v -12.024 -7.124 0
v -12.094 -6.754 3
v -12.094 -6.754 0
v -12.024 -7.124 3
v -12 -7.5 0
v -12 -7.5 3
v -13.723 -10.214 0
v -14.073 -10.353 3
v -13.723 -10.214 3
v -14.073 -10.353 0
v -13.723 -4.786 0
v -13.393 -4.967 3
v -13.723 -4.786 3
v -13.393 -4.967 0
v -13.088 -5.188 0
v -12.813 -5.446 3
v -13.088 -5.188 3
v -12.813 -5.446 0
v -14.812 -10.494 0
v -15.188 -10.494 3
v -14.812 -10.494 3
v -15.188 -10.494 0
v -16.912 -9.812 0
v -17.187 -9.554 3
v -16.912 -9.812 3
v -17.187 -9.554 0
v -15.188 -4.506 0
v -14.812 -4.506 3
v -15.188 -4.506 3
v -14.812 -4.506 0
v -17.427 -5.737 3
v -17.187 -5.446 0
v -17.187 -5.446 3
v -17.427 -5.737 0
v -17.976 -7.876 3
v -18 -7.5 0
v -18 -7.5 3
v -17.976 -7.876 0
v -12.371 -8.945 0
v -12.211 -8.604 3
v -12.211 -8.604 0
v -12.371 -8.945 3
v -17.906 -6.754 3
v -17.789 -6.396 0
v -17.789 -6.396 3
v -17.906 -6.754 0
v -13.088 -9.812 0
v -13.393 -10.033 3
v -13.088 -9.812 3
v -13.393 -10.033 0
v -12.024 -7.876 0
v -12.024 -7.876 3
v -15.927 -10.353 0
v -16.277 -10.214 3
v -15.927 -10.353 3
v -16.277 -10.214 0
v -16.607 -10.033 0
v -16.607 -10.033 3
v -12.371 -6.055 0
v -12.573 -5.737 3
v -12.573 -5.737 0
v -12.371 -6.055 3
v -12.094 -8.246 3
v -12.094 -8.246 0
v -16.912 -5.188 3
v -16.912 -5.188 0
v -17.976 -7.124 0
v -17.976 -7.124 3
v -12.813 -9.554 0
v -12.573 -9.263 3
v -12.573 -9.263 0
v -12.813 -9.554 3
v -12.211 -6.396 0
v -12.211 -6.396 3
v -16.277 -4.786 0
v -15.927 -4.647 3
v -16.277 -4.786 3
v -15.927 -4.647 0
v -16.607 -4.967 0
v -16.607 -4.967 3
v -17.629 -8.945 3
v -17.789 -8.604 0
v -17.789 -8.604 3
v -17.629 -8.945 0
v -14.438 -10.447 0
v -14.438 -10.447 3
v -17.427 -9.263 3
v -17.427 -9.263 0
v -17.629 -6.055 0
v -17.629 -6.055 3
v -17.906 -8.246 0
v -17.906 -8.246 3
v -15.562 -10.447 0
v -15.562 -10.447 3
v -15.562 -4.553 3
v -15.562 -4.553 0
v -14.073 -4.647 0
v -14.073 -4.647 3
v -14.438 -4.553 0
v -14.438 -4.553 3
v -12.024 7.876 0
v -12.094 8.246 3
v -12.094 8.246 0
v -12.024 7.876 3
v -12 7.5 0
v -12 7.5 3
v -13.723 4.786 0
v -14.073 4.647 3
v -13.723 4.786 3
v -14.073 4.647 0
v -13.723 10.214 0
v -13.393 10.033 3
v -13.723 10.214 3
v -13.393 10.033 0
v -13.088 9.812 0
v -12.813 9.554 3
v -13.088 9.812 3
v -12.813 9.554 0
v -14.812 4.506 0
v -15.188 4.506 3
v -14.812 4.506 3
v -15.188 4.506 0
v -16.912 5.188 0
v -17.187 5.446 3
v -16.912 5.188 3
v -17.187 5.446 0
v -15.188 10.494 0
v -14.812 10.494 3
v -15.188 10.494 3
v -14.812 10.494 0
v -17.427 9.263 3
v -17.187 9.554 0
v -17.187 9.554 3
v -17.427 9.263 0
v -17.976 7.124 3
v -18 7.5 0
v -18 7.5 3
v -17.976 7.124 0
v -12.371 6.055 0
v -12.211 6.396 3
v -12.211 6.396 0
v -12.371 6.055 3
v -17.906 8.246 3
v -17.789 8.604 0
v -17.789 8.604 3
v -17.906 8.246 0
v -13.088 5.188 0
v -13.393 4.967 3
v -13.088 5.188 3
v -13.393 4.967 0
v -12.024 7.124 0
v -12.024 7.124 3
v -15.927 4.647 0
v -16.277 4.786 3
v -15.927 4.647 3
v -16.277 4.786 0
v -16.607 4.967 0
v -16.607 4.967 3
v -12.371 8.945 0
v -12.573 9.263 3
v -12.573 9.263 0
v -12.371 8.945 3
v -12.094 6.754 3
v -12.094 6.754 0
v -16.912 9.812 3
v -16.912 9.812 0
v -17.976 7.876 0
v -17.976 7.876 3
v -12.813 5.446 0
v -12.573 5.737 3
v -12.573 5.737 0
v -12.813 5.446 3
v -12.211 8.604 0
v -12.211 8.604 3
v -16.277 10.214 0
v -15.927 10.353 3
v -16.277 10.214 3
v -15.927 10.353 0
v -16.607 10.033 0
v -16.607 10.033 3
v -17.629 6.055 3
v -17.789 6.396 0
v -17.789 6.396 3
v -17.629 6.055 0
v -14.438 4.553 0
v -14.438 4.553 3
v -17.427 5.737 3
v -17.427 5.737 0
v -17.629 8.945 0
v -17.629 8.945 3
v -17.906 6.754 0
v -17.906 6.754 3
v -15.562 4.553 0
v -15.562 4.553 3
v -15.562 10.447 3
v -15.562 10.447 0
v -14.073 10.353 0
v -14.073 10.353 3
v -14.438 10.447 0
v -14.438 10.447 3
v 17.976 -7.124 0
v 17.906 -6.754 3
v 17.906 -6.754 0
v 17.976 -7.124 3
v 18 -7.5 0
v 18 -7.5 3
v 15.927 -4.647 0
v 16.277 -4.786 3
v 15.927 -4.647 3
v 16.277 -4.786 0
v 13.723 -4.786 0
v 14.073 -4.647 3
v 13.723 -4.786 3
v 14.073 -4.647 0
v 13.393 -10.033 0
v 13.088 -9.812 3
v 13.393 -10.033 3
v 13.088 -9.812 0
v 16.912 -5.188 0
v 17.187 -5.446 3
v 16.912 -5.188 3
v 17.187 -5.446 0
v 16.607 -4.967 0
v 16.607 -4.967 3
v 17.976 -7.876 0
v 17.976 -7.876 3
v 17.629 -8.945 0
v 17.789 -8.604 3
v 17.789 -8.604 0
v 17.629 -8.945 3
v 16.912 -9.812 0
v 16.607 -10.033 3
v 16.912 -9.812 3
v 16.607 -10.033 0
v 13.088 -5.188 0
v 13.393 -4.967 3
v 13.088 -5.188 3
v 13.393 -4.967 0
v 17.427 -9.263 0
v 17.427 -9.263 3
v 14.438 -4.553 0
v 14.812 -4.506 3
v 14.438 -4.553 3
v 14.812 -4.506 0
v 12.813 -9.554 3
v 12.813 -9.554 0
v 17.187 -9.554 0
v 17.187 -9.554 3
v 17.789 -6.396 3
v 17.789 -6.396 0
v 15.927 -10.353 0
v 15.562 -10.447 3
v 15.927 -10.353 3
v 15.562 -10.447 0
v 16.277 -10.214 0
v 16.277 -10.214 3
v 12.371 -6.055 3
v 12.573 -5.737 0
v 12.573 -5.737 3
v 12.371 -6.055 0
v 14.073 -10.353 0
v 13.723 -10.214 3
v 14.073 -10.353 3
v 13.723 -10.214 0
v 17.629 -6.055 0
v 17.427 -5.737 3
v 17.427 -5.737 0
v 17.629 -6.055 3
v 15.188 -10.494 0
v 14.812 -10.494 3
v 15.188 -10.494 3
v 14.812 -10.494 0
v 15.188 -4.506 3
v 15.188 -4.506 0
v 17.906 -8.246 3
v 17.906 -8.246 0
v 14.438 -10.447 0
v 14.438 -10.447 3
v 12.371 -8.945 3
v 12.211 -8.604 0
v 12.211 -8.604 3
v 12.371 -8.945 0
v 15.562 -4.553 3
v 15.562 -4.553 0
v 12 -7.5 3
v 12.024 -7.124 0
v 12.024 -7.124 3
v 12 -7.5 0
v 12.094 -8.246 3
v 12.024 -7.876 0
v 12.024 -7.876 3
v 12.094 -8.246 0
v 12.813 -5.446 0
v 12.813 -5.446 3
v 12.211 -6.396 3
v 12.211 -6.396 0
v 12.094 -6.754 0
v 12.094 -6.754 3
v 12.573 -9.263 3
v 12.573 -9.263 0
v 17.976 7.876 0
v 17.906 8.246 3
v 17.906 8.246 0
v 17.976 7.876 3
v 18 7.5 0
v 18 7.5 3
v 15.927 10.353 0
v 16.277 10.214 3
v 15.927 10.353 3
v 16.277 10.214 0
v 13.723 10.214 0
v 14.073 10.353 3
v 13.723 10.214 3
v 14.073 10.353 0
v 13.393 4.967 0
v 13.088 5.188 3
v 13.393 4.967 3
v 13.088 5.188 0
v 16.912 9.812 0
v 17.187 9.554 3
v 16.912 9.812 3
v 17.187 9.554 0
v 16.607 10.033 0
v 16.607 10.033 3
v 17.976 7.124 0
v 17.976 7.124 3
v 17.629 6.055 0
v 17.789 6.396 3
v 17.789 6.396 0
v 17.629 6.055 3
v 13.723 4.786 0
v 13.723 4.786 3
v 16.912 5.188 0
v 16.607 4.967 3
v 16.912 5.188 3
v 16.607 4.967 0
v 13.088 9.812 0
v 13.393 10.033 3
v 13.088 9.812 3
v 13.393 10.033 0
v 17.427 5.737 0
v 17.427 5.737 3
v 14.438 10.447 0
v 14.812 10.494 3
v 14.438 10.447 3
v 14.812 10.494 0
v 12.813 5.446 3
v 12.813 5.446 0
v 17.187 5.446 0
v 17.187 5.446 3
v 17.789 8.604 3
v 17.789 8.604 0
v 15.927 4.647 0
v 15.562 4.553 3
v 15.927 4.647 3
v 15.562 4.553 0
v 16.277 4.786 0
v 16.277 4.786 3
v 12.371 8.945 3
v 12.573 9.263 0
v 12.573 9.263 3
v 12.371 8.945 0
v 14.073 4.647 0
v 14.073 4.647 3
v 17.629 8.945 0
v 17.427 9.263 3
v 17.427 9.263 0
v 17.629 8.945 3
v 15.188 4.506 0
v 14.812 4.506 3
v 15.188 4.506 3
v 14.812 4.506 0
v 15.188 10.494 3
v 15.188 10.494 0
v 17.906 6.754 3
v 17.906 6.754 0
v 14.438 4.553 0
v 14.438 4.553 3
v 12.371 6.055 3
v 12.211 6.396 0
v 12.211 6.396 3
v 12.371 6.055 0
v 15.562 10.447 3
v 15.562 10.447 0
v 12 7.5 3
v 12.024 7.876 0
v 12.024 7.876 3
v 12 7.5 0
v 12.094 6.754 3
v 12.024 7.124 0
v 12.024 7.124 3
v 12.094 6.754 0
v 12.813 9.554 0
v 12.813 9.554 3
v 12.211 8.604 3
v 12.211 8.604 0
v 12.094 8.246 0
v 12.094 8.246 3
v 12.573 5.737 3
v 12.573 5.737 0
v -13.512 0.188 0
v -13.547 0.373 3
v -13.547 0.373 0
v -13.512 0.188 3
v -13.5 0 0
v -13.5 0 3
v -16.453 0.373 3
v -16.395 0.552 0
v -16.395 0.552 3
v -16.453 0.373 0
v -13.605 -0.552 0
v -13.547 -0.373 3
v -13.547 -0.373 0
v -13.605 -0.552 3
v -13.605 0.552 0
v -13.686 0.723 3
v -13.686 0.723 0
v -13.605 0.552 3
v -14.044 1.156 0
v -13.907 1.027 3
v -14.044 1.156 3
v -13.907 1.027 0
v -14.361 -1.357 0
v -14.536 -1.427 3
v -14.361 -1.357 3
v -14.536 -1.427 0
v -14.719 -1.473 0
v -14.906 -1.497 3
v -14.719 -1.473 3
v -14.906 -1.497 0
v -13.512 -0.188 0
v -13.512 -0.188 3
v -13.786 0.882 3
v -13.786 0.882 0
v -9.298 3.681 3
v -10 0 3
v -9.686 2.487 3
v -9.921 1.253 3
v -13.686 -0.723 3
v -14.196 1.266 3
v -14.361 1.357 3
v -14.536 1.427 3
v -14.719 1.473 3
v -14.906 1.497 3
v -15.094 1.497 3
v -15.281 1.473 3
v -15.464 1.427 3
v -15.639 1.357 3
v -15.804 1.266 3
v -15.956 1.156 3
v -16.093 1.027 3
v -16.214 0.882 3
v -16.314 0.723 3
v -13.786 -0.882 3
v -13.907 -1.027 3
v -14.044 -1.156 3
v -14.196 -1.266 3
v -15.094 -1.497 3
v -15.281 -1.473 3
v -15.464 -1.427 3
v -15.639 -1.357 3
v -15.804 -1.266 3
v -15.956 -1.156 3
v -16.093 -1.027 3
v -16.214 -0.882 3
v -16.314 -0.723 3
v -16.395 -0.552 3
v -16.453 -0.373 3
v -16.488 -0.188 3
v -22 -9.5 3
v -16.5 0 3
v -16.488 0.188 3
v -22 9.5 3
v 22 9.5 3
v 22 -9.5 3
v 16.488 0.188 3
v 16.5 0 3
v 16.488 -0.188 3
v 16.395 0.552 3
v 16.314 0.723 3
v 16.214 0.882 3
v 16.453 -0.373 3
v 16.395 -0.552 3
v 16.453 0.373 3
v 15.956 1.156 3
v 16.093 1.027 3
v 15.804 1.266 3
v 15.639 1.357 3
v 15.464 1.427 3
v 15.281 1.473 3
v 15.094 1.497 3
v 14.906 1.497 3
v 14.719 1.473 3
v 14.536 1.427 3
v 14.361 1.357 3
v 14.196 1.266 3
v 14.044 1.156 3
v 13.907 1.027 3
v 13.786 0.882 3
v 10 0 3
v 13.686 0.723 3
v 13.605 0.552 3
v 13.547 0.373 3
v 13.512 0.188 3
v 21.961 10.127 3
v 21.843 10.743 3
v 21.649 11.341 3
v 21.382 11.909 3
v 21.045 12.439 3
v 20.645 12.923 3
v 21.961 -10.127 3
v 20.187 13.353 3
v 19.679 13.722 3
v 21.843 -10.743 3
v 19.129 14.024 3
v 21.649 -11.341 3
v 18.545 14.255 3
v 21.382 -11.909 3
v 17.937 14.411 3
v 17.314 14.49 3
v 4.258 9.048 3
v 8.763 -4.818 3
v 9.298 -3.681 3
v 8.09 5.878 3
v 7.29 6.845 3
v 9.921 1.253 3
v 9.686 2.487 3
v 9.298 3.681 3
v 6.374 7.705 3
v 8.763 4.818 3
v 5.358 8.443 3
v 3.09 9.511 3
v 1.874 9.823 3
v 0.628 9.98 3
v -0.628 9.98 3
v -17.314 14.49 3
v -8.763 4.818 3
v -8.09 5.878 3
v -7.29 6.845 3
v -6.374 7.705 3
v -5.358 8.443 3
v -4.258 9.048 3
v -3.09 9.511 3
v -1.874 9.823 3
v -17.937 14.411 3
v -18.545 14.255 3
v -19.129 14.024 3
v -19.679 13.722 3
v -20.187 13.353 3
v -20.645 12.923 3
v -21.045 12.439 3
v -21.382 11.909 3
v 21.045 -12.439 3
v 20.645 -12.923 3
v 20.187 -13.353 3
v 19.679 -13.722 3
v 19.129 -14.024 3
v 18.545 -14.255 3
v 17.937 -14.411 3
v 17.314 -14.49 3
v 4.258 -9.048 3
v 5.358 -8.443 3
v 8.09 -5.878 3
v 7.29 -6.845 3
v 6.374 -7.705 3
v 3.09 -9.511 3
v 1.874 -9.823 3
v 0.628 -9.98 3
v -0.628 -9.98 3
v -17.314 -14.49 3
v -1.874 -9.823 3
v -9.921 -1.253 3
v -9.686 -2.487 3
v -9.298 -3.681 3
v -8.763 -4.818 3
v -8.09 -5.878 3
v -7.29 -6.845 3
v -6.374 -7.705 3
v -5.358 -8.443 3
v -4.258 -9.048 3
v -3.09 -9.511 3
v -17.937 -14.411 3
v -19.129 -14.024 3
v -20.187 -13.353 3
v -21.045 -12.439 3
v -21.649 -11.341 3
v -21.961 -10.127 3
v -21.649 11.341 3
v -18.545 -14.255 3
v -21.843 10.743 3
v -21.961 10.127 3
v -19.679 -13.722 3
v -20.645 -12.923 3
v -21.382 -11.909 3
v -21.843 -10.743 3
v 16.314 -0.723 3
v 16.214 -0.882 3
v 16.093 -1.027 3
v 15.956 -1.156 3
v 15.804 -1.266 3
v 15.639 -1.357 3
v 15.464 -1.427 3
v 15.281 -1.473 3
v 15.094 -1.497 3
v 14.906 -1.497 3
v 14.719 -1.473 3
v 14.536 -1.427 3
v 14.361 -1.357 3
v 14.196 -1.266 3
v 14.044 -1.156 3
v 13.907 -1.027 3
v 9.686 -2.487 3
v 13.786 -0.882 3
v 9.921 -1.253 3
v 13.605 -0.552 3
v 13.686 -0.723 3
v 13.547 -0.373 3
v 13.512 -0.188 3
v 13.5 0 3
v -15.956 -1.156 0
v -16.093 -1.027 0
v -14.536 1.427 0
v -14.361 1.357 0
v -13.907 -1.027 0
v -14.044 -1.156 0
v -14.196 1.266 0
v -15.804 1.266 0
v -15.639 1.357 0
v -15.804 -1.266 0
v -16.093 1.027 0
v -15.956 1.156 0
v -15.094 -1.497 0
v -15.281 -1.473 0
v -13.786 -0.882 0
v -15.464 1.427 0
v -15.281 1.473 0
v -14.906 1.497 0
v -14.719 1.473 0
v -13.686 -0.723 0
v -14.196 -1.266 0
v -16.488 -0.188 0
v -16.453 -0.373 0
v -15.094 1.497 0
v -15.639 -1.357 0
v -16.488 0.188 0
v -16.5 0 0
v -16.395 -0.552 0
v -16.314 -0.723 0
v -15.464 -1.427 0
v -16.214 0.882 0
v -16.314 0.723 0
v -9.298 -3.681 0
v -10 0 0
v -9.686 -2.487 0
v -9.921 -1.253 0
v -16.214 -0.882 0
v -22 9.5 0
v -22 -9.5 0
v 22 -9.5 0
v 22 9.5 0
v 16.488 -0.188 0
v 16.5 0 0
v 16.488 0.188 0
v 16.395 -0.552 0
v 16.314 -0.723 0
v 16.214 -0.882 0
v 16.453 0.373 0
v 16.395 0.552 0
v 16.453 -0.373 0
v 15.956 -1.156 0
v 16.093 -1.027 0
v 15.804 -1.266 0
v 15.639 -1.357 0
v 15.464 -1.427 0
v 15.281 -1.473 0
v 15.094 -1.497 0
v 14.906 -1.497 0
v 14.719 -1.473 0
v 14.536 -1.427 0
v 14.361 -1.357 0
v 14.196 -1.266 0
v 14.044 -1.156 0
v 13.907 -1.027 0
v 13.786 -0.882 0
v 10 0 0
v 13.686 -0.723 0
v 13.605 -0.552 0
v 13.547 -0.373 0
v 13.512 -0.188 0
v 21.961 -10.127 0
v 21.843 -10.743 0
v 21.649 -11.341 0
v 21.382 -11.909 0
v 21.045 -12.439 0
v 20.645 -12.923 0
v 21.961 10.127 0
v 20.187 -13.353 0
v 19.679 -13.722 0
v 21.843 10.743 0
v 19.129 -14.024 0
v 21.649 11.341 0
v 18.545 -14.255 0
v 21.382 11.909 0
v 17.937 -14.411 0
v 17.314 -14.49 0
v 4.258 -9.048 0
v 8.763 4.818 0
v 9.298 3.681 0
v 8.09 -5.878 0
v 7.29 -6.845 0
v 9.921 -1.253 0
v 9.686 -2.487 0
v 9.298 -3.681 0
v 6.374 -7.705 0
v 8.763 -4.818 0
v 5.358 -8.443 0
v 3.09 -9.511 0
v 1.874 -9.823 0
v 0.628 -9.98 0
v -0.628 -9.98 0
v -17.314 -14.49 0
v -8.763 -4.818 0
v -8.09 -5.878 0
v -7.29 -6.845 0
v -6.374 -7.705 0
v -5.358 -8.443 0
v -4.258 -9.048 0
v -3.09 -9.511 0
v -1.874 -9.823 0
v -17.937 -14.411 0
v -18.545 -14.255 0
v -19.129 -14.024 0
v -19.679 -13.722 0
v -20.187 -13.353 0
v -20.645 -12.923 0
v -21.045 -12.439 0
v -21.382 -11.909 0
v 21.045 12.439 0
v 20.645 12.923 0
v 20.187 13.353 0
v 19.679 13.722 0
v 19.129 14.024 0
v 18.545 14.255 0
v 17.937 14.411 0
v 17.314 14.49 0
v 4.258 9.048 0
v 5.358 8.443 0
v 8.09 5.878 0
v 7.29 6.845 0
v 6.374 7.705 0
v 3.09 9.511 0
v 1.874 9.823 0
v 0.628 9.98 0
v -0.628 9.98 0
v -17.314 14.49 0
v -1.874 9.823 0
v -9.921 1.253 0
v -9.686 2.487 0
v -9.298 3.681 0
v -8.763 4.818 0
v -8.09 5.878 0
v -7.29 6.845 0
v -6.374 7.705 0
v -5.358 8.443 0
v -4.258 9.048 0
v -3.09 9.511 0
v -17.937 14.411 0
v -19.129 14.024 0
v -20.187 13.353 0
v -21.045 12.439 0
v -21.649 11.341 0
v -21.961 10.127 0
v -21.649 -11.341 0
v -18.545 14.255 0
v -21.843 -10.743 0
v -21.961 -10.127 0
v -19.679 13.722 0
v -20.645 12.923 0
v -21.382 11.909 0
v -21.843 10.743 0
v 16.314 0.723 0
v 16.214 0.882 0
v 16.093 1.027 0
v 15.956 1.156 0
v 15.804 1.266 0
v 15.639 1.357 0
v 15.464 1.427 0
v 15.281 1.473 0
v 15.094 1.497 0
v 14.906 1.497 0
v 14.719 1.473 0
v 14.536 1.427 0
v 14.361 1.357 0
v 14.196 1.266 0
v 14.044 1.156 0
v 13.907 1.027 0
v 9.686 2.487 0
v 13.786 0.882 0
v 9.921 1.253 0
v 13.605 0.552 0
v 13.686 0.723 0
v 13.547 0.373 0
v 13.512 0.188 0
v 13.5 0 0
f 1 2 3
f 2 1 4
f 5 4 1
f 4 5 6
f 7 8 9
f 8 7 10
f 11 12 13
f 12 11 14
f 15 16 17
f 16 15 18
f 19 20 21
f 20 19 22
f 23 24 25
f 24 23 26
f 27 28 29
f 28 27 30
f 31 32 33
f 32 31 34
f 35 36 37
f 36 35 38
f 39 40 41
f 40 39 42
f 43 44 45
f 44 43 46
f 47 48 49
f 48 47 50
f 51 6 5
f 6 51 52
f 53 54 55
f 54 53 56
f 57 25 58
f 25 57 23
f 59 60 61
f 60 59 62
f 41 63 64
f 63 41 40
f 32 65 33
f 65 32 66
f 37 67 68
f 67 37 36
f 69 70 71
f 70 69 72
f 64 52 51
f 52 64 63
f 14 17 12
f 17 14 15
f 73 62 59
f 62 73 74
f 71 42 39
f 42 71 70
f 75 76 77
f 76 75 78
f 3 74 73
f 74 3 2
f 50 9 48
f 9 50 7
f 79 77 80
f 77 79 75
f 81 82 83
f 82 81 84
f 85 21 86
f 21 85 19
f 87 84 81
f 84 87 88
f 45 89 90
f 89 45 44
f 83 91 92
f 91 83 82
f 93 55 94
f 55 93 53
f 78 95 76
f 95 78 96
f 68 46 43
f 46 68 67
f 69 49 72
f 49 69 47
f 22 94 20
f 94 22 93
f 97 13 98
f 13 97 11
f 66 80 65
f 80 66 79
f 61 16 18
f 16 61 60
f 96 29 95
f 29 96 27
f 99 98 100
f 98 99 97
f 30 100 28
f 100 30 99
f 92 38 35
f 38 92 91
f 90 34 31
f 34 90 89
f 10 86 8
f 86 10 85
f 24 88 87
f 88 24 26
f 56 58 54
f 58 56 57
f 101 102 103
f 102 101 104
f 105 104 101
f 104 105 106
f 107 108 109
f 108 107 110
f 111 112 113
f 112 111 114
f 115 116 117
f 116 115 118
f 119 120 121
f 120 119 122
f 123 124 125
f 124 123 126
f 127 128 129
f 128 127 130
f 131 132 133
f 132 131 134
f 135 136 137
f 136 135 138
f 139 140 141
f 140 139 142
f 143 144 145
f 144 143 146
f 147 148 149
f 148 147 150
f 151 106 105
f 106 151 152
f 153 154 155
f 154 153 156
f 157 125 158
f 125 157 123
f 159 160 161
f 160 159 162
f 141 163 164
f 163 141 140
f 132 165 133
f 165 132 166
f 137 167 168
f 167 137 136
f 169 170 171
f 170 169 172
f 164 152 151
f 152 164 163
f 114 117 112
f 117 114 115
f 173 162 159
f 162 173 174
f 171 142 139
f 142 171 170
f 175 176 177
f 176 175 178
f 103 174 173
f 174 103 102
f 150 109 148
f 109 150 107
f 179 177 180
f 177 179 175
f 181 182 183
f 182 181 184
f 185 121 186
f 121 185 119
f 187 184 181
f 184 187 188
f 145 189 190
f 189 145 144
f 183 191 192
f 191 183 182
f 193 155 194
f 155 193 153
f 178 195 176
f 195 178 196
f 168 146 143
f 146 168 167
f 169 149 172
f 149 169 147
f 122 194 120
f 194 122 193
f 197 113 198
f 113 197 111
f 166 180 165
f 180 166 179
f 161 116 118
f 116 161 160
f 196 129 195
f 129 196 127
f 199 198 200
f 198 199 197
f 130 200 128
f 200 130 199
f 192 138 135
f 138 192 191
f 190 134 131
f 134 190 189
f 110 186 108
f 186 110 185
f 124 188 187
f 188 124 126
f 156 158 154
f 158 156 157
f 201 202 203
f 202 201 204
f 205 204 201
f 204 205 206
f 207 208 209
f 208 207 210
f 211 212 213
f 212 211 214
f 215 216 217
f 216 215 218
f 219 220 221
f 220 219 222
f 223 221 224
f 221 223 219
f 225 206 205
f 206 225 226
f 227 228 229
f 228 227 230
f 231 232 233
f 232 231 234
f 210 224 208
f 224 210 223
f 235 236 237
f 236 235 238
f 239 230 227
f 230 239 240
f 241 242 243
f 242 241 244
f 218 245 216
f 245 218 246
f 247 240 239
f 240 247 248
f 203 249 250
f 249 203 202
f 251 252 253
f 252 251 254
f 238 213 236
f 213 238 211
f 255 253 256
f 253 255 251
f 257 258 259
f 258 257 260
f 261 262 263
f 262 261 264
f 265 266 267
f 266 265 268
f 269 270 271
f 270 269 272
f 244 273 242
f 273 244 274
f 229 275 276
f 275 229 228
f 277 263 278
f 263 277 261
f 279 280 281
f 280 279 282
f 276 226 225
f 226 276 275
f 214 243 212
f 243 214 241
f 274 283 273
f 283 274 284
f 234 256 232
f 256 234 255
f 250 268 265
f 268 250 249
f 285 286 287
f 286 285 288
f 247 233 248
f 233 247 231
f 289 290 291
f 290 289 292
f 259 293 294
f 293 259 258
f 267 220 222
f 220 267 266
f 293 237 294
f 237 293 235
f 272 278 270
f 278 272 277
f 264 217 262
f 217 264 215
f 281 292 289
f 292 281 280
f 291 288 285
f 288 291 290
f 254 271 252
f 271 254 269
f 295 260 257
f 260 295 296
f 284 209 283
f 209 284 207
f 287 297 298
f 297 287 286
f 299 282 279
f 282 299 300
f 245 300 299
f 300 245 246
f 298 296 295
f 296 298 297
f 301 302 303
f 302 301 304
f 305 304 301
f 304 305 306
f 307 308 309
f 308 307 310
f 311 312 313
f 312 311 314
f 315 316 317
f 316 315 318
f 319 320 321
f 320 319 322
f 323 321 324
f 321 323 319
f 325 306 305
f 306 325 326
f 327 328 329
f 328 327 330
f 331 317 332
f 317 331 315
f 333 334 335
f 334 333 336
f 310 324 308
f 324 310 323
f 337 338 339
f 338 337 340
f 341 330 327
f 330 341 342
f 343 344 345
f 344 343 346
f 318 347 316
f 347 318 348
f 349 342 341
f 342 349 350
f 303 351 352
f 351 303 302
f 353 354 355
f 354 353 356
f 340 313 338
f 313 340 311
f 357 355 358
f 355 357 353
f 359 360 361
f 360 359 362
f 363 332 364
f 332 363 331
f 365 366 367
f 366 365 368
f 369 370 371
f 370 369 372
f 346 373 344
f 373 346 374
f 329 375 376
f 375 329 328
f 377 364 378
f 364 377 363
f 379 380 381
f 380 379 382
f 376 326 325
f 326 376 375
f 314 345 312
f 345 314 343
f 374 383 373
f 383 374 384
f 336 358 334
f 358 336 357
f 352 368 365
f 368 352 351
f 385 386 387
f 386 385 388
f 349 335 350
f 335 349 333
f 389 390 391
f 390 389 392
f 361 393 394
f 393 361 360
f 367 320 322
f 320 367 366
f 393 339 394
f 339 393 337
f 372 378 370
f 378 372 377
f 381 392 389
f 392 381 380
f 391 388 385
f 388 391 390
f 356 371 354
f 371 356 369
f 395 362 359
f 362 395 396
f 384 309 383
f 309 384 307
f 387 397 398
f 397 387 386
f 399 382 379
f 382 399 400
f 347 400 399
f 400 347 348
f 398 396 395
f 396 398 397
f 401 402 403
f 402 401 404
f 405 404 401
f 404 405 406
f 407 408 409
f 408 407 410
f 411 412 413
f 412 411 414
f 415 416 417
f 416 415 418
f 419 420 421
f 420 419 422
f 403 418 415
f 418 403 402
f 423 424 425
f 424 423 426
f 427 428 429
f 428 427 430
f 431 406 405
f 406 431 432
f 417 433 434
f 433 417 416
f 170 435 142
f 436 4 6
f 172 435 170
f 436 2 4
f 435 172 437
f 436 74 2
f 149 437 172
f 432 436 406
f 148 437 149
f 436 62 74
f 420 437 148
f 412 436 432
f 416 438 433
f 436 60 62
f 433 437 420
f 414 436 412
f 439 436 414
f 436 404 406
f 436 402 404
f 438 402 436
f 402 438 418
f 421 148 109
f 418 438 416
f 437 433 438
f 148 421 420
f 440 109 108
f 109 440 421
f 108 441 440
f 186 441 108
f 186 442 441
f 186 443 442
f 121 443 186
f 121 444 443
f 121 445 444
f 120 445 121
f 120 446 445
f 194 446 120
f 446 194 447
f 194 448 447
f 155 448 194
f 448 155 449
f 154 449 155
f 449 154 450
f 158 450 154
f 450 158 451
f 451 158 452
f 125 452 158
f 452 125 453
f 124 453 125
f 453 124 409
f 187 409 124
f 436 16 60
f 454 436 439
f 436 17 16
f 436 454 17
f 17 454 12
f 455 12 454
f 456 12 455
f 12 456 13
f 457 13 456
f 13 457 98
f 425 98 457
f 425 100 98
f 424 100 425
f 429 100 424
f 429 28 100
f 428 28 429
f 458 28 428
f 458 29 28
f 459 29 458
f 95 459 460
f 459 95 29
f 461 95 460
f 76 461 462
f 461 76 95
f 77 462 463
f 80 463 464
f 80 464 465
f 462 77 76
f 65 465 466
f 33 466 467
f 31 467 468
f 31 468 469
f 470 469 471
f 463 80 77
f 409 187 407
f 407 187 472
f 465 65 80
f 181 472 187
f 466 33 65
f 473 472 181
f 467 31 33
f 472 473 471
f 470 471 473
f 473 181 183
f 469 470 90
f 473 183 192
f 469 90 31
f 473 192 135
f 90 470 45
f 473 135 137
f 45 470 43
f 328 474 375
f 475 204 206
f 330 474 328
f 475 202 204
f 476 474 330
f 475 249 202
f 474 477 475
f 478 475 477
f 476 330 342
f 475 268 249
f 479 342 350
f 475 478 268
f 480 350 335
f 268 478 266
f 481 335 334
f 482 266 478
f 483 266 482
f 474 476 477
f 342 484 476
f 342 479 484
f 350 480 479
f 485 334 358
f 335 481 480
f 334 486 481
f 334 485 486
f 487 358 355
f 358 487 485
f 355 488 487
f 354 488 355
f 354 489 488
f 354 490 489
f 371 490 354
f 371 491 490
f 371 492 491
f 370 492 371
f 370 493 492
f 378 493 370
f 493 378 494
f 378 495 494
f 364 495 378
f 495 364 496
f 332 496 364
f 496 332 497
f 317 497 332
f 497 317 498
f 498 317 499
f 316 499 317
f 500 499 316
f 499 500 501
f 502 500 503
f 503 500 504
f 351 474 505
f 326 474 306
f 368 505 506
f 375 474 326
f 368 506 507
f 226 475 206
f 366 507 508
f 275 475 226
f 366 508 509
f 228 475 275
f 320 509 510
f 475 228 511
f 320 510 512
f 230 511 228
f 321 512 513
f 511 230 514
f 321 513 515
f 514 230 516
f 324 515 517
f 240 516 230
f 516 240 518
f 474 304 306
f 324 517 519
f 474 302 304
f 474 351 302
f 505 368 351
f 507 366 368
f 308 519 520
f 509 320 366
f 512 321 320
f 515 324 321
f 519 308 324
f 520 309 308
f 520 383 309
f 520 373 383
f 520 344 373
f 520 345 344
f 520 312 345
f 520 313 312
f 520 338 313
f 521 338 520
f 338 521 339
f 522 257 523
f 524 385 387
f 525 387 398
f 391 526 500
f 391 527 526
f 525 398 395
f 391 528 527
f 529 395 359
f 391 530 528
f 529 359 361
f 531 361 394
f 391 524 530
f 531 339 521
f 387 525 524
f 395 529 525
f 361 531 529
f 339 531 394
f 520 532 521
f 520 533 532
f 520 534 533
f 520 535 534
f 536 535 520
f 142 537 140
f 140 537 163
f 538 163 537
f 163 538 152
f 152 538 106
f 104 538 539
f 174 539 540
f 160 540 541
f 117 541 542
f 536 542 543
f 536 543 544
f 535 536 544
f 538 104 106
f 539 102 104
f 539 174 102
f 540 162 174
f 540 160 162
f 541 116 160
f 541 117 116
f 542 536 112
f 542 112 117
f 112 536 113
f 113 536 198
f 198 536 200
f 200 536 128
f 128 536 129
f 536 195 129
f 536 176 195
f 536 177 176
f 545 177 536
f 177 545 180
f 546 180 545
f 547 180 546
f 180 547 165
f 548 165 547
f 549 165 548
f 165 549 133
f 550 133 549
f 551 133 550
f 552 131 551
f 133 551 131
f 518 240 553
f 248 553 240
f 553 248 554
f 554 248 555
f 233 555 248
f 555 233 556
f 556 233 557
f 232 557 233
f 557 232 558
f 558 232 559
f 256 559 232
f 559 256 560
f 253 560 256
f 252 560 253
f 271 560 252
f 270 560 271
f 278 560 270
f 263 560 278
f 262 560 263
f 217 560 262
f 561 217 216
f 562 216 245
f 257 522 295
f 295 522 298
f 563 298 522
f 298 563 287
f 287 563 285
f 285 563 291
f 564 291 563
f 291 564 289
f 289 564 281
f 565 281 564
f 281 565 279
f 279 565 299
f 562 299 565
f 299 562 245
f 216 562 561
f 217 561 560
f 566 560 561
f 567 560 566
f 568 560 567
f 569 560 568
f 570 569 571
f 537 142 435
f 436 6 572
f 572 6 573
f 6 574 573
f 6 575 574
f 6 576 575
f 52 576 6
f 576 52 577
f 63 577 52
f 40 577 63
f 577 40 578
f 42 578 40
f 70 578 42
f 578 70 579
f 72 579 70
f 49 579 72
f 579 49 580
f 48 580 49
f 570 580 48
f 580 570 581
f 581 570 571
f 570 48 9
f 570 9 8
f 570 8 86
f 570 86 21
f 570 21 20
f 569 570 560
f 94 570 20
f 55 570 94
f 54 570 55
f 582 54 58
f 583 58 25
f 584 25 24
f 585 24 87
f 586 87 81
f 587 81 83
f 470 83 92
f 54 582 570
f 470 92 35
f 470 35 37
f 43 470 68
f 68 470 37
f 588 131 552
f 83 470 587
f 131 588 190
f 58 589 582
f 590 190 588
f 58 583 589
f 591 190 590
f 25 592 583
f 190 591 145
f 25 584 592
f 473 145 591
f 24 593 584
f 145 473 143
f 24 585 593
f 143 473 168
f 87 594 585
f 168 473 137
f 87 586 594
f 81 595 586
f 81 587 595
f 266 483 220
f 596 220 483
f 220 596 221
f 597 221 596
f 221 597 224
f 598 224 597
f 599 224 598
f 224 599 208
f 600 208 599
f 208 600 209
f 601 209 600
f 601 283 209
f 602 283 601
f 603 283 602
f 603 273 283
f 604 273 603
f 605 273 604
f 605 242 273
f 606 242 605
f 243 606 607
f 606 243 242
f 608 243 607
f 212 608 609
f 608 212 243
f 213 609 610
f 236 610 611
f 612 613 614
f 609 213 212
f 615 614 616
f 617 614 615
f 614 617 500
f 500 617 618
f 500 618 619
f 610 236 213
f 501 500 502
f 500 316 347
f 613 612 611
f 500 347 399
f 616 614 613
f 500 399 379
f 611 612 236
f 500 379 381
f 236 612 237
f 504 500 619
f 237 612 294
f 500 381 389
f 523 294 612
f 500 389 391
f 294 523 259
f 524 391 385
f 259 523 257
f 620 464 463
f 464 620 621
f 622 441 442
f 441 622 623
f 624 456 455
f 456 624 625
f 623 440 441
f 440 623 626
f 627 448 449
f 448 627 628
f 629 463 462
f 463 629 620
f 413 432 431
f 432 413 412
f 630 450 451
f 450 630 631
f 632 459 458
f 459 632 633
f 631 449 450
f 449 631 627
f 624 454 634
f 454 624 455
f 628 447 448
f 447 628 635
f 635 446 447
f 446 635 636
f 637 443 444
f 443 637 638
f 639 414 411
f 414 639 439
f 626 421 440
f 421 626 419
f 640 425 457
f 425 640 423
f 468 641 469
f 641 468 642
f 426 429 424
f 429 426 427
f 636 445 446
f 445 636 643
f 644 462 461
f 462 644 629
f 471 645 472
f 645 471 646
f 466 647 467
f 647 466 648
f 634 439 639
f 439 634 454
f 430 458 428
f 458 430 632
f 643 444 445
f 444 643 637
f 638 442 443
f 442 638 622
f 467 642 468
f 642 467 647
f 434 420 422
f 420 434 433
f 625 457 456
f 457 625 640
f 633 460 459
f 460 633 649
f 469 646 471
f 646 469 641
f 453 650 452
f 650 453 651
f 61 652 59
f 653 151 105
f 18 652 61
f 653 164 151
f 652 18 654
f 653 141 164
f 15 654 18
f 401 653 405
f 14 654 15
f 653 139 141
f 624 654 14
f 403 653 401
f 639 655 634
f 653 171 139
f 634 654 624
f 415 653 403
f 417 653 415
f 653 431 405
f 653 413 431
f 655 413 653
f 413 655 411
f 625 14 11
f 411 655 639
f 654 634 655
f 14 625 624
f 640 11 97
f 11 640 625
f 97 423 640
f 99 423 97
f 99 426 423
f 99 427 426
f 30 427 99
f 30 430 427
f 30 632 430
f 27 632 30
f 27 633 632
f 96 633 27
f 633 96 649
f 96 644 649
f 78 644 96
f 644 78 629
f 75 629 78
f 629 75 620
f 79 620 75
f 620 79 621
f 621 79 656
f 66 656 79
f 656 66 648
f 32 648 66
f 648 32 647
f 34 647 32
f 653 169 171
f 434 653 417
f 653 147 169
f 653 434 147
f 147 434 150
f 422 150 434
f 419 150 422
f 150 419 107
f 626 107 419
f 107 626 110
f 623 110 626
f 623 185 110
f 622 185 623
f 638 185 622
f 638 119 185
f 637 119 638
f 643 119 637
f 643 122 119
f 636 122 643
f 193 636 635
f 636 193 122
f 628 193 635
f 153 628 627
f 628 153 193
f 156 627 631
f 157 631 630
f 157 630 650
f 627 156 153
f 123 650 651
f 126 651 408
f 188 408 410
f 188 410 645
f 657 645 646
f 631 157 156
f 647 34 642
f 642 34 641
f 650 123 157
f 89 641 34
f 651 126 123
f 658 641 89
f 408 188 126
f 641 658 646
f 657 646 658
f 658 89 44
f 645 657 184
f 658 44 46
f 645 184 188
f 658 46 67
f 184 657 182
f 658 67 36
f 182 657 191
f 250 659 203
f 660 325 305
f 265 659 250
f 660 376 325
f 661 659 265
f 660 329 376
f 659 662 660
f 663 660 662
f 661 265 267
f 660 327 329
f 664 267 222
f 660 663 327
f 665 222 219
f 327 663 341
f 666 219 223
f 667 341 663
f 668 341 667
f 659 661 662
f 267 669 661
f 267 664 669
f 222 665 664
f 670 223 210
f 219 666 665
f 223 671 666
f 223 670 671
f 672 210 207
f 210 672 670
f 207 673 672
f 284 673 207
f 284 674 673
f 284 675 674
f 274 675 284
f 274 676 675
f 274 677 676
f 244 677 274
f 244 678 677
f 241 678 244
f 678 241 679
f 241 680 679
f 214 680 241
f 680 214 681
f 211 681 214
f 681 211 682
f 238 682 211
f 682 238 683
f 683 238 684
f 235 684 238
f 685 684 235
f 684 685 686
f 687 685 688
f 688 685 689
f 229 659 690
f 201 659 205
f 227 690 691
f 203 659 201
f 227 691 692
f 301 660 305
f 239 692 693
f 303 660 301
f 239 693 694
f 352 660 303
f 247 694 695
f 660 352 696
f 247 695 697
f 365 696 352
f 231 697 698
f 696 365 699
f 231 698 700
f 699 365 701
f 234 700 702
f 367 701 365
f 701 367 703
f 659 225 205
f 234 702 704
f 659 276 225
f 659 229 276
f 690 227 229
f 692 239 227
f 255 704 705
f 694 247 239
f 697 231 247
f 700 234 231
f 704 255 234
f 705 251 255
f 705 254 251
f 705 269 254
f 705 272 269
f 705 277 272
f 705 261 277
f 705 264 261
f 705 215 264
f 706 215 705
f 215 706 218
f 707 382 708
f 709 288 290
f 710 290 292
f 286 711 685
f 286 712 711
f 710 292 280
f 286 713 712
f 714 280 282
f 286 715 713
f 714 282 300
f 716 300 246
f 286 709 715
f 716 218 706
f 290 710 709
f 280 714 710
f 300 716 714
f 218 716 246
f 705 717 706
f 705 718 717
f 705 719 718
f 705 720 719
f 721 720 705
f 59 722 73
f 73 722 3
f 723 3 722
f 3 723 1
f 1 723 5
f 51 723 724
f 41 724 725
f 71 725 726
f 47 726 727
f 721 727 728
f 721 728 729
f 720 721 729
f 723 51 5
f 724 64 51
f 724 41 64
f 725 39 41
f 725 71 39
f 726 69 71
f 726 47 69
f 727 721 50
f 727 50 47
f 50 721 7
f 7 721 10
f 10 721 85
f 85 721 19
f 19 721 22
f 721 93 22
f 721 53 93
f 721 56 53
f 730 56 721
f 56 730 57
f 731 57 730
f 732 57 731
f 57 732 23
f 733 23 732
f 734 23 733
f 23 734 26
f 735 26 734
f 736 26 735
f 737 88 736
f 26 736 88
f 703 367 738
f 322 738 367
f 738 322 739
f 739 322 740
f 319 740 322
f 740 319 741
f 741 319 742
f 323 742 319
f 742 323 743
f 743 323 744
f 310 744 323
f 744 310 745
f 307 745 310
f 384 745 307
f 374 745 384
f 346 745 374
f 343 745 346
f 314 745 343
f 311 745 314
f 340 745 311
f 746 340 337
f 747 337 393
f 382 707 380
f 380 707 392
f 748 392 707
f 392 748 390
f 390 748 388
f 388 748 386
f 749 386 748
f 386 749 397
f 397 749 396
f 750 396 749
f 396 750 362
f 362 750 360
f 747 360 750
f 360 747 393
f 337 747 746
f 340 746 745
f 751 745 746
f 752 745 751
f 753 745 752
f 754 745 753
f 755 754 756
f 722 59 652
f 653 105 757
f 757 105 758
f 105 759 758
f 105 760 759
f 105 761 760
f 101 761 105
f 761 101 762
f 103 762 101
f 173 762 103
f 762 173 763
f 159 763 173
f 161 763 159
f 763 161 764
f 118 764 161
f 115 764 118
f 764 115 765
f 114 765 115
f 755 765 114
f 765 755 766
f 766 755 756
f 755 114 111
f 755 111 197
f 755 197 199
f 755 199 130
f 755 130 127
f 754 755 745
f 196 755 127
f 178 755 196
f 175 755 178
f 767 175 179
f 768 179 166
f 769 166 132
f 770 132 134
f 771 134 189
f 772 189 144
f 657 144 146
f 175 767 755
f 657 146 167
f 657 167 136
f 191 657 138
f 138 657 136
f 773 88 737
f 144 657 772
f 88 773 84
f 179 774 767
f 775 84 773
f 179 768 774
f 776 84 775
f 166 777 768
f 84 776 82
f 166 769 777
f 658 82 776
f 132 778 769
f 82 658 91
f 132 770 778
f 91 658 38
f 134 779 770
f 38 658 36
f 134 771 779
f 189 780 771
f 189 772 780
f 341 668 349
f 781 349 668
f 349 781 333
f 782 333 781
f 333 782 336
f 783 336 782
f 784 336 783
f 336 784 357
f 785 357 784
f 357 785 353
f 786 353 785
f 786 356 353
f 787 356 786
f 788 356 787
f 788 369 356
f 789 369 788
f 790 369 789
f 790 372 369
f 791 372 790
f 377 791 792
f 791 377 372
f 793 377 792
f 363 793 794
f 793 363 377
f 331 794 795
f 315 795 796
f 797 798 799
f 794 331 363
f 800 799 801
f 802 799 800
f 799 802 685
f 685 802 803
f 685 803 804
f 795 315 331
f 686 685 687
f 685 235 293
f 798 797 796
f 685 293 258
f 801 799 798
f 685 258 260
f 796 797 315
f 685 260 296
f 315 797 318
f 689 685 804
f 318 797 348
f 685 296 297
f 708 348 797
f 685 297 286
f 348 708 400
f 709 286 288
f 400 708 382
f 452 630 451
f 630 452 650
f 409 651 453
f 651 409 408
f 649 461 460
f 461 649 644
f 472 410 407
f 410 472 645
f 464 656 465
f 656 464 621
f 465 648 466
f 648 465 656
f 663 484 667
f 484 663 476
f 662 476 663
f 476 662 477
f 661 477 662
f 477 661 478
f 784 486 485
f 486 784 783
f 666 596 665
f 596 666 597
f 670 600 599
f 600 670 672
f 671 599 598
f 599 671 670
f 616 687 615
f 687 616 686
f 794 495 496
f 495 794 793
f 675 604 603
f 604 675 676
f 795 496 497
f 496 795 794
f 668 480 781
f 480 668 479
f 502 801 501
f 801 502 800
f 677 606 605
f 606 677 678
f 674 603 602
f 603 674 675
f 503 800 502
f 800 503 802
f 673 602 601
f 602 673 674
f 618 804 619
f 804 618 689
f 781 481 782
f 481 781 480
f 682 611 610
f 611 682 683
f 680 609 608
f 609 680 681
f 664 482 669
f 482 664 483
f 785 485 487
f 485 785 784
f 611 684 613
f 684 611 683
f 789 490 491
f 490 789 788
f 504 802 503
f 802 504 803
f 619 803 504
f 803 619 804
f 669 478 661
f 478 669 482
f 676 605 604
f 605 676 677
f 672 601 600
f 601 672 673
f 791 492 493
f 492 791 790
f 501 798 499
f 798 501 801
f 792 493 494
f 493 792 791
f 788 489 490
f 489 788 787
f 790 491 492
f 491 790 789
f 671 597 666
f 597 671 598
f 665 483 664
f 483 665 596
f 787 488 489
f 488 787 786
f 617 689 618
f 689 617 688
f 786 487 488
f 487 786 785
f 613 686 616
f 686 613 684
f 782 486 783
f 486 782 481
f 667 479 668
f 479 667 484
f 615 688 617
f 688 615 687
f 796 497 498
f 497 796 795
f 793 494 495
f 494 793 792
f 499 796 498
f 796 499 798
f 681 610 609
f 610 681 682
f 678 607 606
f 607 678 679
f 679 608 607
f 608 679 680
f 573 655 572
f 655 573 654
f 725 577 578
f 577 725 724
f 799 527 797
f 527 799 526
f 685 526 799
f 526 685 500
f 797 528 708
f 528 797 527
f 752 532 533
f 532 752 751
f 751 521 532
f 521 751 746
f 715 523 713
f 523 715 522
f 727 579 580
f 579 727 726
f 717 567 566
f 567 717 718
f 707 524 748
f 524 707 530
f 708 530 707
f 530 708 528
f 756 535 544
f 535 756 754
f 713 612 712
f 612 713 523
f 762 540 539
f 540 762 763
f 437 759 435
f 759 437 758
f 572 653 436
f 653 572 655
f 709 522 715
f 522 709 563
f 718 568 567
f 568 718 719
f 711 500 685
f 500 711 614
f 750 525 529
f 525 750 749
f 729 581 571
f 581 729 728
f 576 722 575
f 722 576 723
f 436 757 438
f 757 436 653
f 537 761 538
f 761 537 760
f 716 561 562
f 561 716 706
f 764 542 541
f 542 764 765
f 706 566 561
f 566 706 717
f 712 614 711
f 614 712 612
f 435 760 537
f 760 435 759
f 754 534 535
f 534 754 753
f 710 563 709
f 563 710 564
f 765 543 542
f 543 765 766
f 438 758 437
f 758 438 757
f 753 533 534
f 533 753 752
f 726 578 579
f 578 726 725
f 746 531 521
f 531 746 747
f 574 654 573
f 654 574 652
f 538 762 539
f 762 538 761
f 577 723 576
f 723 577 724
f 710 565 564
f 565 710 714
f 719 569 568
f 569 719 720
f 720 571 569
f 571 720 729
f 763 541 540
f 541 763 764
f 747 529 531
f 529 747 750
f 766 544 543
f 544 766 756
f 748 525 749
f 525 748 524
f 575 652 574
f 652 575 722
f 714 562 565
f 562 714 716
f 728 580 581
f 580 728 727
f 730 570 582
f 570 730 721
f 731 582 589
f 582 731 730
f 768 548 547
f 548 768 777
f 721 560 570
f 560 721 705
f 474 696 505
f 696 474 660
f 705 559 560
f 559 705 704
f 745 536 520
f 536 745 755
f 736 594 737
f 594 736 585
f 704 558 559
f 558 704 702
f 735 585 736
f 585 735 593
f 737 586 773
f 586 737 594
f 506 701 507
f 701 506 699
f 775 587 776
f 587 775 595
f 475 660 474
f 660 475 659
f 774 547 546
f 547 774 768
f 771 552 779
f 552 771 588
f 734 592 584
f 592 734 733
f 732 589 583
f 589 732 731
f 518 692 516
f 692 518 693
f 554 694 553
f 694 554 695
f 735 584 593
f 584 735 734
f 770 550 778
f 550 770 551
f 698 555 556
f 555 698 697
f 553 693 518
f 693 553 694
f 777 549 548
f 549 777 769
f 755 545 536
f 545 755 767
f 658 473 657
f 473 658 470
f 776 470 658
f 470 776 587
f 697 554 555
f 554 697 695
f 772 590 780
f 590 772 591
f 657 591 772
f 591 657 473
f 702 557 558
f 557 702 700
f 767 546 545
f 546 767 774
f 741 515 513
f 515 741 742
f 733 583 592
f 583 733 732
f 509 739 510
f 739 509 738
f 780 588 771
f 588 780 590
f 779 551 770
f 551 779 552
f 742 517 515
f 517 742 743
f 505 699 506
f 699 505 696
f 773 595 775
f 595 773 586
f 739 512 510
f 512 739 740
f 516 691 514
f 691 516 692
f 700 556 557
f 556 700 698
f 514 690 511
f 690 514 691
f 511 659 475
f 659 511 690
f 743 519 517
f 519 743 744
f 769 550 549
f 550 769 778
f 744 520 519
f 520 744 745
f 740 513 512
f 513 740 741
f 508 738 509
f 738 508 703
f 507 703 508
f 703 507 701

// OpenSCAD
$fn = 50;


difference() {
	union() {
		hull() {
			translate(v = [-17.0000000000, 9.5000000000, 0]) {
				cylinder(h = 3, r = 5);
			}
			translate(v = [17.0000000000, 9.5000000000, 0]) {
				cylinder(h = 3, r = 5);
			}
			translate(v = [-17.0000000000, -9.5000000000, 0]) {
				cylinder(h = 3, r = 5);
			}
			translate(v = [17.0000000000, -9.5000000000, 0]) {
				cylinder(h = 3, r = 5);
			}
		}
	}
	union() {
		#translate(v = [-15.0000000000, -7.5000000000, 0]) {
			cylinder(h = 3, r = 3.0000000000);
		}
		#translate(v = [-15.0000000000, 7.5000000000, 0]) {
			cylinder(h = 3, r = 3.0000000000);
		}
		#translate(v = [15.0000000000, -7.5000000000, 0]) {
			cylinder(h = 3, r = 3.0000000000);
		}
		#translate(v = [15.0000000000, 7.5000000000, 0]) {
			cylinder(h = 3, r = 3.0000000000);
		}
		#translate(v = [-15.0000000000, -7.5000000000, -100.0000000000]) {
			cylinder(h = 200, r = 3.0000000000);
		}
		#translate(v = [-15.0000000000, 7.5000000000, -100.0000000000]) {
			cylinder(h = 200, r = 3.0000000000);
		}
		#translate(v = [15.0000000000, -7.5000000000, -100.0000000000]) {
			cylinder(h = 200, r = 3.0000000000);
		}
		#translate(v = [15.0000000000, 7.5000000000, -100.0000000000]) {
			cylinder(h = 200, r = 3.0000000000);
		}
		#translate(v = [-15.0000000000, -7.5000000000, 0]) {
			cylinder(h = 3, r = 1.5000000000);
		}
		#translate(v = [-15.0000000000, 0.0000000000, 0]) {
			cylinder(h = 3, r = 1.5000000000);
		}
		#translate(v = [-15.0000000000, 7.5000000000, 0]) {
			cylinder(h = 3, r = 1.5000000000);
		}
		#translate(v = [15.0000000000, -7.5000000000, 0]) {
			cylinder(h = 3, r = 1.5000000000);
		}
		#translate(v = [15.0000000000, 0.0000000000, 0]) {
			cylinder(h = 3, r = 1.5000000000);
		}
		#translate(v = [15.0000000000, 7.5000000000, 0]) {
			cylinder(h = 3, r = 1.5000000000);
		}
		#translate(v = [-15.0000000000, -7.5000000000, 0]) {
			cylinder(h = 3, r = 1.5000000000);
		}
		#translate(v = [-15.0000000000, 0.0000000000, 0]) {
			cylinder(h = 3, r = 1.5000000000);
		}
		#translate(v = [-15.0000000000, 7.5000000000, 0]) {
			cylinder(h = 3, r = 1.5000000000);
		}
		#translate(v = [15.0000000000, -7.5000000000, 0]) {
			cylinder(h = 3, r = 1.5000000000);
		}
		#translate(v = [15.0000000000, 0.0000000000, 0]) {
			cylinder(h = 3, r = 1.5000000000);
		}
		#translate(v = [15.0000000000, 7.5000000000, 0]) {
			cylinder(h = 3, r = 1.5000000000);
		}
		#translate(v = [-15.0000000000, -7.5000000000, 0]) {
			cylinder(h = 3, r = 1.5000000000);
		}
		#translate(v = [-15.0000000000, 0.0000000000, 0]) {
			cylinder(h = 3, r = 1.5000000000);
		}
		#translate(v = [-15.0000000000, 7.5000000000, 0]) {
			cylinder(h = 3, r = 1.5000000000);
		}
		#translate(v = [15.0000000000, -7.5000000000, 0]) {
			cylinder(h = 3, r = 1.5000000000);
		}
		#translate(v = [15.0000000000, 0.0000000000, 0]) {
			cylinder(h = 3, r = 1.5000000000);
		}
		#translate(v = [15.0000000000, 7.5000000000, 0]) {
			cylinder(h = 3, r = 1.5000000000);
		}
		#cylinder(h = 3, r = 10.0000000000);
	}
}
